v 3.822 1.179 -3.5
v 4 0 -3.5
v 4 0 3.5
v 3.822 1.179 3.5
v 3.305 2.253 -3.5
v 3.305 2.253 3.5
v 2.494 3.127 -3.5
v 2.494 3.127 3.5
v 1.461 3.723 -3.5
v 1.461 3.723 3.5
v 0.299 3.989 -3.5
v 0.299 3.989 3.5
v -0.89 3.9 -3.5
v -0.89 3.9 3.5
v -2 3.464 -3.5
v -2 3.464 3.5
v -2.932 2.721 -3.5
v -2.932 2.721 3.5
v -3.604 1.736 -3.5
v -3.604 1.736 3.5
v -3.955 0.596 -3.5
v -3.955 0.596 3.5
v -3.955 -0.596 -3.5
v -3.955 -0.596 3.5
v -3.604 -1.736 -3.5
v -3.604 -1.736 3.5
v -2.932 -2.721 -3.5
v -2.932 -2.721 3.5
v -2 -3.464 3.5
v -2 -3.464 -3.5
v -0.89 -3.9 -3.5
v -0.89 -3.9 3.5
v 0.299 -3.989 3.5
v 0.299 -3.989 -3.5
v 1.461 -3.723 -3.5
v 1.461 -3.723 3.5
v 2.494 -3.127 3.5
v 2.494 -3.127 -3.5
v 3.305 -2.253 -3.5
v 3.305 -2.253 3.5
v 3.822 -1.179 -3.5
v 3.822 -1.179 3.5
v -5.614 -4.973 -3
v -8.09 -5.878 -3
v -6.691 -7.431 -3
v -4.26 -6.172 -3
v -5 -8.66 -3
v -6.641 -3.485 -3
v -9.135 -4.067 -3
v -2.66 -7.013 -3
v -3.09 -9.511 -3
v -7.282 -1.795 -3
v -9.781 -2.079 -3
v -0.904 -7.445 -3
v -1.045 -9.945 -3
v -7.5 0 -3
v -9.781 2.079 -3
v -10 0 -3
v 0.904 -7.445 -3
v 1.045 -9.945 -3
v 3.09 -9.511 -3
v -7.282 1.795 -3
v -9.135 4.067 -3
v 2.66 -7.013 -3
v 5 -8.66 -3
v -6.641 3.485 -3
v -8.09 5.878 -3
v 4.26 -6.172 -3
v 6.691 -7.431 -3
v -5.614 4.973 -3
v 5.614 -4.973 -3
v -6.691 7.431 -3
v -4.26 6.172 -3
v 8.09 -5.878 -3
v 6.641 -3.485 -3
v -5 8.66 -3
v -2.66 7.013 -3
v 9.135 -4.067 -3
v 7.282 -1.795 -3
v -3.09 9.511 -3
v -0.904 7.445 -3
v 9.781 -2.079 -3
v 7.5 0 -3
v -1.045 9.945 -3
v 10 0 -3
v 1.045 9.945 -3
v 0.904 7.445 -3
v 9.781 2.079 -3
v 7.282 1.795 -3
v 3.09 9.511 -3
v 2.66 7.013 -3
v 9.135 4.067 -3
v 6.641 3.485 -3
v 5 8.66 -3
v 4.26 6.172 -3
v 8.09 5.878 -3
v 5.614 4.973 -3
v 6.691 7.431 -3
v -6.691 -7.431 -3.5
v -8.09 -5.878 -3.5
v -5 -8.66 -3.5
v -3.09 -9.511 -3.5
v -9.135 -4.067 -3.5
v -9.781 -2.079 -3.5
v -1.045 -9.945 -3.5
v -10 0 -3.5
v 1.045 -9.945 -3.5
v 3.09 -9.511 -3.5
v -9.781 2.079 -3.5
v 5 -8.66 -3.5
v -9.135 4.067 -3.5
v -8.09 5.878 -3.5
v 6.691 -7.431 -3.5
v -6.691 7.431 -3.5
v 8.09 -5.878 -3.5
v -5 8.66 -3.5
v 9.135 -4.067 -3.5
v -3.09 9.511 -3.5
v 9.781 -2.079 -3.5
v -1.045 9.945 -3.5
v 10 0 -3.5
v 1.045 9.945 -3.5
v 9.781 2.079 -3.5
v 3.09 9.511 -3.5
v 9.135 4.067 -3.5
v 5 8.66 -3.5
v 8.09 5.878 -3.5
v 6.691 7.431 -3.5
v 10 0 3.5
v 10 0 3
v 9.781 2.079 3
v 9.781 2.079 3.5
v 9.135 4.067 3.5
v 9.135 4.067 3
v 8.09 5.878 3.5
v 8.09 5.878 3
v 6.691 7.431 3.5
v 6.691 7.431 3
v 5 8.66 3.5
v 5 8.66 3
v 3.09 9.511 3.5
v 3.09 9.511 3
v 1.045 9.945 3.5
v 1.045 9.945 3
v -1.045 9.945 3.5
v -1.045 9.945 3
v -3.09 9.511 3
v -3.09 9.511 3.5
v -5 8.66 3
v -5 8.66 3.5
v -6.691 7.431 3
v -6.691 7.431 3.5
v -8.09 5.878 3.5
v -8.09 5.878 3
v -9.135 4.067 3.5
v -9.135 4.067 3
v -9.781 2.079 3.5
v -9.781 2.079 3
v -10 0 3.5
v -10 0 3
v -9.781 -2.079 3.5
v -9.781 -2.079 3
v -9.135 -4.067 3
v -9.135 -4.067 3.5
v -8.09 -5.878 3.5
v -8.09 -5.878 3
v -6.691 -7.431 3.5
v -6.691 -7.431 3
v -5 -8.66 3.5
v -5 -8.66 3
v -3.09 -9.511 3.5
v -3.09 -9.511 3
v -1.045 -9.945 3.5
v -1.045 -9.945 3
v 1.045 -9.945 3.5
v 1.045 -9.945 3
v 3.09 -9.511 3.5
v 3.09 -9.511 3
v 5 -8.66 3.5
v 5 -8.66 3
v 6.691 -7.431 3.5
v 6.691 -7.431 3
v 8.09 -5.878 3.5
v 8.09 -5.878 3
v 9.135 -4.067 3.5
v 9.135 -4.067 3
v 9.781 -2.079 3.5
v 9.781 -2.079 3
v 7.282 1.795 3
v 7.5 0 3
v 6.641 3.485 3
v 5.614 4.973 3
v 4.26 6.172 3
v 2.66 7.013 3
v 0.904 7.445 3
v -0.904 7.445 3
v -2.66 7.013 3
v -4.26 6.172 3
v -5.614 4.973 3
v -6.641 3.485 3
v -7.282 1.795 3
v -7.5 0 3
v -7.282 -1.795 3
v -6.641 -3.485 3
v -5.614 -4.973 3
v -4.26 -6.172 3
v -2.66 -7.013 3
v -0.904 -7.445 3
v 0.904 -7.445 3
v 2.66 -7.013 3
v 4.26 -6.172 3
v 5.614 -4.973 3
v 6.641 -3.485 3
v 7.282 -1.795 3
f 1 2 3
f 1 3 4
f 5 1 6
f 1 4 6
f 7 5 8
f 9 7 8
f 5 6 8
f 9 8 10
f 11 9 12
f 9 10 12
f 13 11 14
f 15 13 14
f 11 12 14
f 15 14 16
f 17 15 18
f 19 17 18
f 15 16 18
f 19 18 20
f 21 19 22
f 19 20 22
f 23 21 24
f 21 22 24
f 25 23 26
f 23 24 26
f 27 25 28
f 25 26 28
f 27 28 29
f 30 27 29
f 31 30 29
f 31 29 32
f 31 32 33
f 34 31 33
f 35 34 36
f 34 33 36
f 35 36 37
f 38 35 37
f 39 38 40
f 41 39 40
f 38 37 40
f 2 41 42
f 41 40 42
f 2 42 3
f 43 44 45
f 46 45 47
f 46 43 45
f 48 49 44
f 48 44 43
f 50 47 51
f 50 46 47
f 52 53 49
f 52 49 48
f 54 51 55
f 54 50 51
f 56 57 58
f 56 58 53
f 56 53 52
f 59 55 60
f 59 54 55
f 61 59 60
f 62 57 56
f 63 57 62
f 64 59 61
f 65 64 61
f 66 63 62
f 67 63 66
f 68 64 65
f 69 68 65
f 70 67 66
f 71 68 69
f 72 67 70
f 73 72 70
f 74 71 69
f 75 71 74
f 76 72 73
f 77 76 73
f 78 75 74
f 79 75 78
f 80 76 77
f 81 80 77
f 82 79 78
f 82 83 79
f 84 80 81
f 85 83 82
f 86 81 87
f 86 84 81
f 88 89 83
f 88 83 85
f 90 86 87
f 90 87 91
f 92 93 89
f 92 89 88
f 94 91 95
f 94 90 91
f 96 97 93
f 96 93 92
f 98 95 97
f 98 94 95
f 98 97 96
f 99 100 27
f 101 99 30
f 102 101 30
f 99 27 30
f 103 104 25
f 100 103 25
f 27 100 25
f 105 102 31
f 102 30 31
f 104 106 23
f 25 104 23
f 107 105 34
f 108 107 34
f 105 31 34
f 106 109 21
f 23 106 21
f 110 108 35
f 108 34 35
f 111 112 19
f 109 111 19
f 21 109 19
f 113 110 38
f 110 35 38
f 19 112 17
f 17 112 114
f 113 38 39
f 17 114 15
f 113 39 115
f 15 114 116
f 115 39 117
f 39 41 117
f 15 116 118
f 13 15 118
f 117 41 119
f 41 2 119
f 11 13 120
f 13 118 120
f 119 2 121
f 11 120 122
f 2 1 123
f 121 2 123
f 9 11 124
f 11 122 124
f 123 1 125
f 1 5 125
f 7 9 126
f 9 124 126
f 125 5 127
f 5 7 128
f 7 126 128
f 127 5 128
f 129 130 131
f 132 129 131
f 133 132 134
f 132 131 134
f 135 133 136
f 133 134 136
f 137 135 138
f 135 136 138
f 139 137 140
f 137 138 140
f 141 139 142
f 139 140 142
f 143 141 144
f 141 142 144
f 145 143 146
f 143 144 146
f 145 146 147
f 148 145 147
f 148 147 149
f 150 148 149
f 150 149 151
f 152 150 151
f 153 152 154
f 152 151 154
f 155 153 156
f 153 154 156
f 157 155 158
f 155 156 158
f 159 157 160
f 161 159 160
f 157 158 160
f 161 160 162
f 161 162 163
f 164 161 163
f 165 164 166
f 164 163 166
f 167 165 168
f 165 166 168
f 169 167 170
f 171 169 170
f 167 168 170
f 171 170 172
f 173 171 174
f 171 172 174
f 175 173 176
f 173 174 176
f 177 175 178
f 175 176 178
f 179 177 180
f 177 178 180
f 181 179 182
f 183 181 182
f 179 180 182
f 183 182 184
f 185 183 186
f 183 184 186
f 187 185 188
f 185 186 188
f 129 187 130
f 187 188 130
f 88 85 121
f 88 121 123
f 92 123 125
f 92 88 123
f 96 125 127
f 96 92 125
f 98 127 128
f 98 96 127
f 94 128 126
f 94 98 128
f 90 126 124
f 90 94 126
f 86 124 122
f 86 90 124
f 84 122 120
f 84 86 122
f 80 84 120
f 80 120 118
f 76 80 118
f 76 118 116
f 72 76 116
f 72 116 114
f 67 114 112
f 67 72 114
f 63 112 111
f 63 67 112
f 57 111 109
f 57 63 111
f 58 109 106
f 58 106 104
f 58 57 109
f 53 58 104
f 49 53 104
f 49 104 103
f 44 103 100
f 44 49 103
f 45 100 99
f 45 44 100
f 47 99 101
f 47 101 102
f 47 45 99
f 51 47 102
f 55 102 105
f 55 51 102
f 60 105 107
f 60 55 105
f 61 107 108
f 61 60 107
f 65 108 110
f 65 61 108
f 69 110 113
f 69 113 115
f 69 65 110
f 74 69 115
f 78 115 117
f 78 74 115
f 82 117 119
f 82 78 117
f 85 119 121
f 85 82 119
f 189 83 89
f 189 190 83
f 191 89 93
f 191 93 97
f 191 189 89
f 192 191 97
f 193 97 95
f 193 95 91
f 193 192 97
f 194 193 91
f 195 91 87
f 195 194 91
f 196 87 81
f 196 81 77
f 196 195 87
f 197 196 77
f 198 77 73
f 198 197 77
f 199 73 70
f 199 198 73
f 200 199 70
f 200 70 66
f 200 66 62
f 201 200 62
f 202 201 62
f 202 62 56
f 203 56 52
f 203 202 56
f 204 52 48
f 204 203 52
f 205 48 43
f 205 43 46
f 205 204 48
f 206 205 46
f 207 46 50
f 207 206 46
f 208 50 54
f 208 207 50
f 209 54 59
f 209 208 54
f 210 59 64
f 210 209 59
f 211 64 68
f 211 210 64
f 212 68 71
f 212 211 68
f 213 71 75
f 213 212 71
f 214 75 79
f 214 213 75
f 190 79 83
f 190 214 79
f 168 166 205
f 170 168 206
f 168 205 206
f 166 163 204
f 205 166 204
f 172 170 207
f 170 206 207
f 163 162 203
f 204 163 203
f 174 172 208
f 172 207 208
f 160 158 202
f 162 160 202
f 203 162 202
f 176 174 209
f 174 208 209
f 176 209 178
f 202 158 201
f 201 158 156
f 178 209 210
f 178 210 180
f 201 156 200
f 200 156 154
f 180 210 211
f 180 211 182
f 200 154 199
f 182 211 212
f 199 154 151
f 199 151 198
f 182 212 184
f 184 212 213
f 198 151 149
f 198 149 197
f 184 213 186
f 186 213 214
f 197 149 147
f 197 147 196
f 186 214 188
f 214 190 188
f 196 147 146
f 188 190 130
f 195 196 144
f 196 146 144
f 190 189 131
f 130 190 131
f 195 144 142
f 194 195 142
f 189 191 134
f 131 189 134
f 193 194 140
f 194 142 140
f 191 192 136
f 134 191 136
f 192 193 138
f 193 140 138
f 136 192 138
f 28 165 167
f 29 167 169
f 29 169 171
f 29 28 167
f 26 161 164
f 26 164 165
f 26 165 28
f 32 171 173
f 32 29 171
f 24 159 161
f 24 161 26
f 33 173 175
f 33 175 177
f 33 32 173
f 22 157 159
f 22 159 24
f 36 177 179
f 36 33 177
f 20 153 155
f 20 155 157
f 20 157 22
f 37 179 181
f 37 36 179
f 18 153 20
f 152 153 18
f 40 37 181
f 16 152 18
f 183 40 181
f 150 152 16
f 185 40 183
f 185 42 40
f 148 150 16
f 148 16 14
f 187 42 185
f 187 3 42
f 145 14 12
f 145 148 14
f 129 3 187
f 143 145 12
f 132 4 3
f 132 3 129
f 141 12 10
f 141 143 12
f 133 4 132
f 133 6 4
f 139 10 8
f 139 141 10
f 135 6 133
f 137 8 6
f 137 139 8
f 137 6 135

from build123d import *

# Parameters (mm, degrees)
F0_R     = 7.5
F0_R_2   = 4
F1_DEPTH = 3
F2_R     = 10
F2_R_2   = 7.5
F2_R_3   = 4
F3_DEPTH = 0.5


with BuildPart() as f1:
    # F0 (on Top) → F1 (new body)
    with BuildSketch(Plane.XY):
        Circle(F0_R)
        Circle(F0_R_2, mode=Mode.SUBTRACT)
    extrude(amount=F1_DEPTH)

    # F2 (on face) → F3 (join)
    with BuildSketch(Plane.XY.offset(3)):
        Circle(F2_R)
        Circle(F2_R_2, mode=Mode.SUBTRACT)
        Circle(F2_R_2)
        Circle(F2_R_3, mode=Mode.SUBTRACT)
    extrude(amount=F3_DEPTH)

    # F4: F1 across face


with BuildPart() as f1_1:
    add(f1.part)
    add(f1.part.mirror(Plane(origin=(0, 0, 0), x_dir=(1, 0, 0), z_dir=(0, 0, -1))))


solid = f1_1.part
